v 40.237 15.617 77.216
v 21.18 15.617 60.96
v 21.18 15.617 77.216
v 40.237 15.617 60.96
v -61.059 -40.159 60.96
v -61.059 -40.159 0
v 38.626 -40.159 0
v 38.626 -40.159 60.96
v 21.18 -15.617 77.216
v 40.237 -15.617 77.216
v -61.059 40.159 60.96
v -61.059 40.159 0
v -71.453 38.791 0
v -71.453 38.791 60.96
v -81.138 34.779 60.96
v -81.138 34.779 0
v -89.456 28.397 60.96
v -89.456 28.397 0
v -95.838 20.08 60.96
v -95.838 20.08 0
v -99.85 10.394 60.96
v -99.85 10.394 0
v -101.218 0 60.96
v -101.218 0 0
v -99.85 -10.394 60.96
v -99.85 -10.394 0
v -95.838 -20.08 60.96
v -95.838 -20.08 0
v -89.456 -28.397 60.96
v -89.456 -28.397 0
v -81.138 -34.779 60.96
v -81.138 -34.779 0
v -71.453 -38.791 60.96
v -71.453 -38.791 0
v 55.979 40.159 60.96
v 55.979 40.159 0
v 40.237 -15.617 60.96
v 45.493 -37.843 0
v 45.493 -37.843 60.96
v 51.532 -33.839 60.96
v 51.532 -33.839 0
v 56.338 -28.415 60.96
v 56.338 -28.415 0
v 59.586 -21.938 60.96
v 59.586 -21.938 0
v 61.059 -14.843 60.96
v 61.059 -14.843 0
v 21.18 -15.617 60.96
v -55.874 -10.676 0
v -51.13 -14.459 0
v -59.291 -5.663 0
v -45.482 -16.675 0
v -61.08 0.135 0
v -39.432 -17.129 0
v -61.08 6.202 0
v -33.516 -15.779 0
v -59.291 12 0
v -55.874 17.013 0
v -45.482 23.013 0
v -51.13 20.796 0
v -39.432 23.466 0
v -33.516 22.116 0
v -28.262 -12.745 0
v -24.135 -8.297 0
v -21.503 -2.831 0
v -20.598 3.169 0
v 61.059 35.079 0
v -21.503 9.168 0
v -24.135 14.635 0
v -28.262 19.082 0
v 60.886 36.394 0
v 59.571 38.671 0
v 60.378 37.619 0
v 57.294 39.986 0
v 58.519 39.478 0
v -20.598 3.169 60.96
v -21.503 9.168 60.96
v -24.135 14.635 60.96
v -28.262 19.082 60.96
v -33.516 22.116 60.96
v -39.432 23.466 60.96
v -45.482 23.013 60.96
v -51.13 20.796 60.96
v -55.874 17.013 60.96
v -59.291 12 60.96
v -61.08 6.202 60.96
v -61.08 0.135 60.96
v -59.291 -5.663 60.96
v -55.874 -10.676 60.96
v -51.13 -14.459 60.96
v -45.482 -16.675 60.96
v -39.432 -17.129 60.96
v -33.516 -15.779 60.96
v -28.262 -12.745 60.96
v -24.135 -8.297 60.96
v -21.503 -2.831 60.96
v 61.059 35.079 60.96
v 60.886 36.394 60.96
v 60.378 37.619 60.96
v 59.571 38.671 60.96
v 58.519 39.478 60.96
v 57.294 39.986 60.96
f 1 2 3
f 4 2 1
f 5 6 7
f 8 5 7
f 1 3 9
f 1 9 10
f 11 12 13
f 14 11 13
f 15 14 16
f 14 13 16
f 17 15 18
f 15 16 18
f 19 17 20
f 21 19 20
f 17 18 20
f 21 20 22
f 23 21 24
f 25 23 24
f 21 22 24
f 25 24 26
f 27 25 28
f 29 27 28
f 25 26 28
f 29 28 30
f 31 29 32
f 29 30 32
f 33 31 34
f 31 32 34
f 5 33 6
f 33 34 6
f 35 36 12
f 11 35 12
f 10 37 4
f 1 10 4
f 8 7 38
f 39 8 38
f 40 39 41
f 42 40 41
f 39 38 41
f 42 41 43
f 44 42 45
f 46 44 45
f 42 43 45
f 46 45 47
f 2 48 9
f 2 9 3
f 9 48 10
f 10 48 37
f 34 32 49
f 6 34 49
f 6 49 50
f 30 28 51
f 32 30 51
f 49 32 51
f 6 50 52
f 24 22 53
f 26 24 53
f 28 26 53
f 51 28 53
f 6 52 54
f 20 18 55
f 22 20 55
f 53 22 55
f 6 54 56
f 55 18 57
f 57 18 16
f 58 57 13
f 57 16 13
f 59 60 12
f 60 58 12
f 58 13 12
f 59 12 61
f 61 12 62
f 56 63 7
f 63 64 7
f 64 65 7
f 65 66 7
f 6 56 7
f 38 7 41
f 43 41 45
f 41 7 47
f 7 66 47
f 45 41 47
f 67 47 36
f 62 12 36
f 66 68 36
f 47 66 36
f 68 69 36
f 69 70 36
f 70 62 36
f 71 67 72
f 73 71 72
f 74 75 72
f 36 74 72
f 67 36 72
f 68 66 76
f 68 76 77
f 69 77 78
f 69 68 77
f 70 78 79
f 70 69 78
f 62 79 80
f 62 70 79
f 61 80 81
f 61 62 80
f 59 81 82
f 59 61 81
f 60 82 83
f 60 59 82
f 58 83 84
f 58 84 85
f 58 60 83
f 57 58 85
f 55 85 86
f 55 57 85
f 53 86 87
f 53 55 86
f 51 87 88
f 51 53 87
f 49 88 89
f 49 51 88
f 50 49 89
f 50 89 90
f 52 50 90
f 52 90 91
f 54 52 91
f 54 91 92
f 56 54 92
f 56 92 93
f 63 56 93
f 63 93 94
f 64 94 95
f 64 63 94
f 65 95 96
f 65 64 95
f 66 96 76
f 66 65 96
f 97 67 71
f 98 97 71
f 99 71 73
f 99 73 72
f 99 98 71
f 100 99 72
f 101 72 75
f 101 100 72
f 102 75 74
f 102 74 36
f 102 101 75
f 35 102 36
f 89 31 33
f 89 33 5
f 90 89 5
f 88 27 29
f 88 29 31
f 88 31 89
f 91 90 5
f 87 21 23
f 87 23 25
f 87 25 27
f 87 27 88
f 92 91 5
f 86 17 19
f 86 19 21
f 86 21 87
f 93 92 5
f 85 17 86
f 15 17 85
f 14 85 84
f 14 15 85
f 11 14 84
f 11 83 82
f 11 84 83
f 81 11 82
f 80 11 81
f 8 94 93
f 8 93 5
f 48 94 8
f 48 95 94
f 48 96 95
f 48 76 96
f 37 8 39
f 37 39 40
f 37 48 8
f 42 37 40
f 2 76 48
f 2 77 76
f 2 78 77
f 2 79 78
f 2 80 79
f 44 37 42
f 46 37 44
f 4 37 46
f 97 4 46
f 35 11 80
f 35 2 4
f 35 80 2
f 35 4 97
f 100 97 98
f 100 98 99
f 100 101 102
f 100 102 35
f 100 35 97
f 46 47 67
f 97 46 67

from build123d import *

# Parameters (mm, degrees)
F0_R     = 20.354373
F1_DEPTH = 60.96
F2_R     = 5.08
F3_W     = 19.056432
F3_H     = 31.234418
F4_DEPTH = 16.256


with BuildPart() as f1:
    # F0 (on Top) → F1 (new body)
    with BuildSketch(Plane.XY):
        with BuildLine():
            Line((61.058927, -14.842805), (61.058927, 40.159032))
            Line((61.058927, 40.159032), (-61.058927, 40.159032))
            ThreePointArc((-61.058927, 40.159032), (-101.217959, 0), (-61.058927, -40.159032))
            Line((-61.058927, -40.159032), (38.626283, -40.159032))
            ThreePointArc((38.626283, -40.159032), (54.111335, -31.283429), (61.058927, -14.842805))
        make_face()
        with Locations((-40.952704, 3.168637)):
            Circle(F0_R, mode=Mode.SUBTRACT)
    extrude(amount=F1_DEPTH)

    # F2
    f2_edges = [f1.edges().sort_by_distance(p)[0] for p in [
        (61.058927, 40.159032, 30.48),
    ]]
    fillet(f2_edges, radius=F2_R)

    # F3 (on face) → F4 (join)
    with BuildSketch(Plane.XY.offset(60.96)):
        with Locations((30.708643, 0)):
            Rectangle(F3_W, F3_H)
    extrude(amount=F4_DEPTH)


solid = f1.part
